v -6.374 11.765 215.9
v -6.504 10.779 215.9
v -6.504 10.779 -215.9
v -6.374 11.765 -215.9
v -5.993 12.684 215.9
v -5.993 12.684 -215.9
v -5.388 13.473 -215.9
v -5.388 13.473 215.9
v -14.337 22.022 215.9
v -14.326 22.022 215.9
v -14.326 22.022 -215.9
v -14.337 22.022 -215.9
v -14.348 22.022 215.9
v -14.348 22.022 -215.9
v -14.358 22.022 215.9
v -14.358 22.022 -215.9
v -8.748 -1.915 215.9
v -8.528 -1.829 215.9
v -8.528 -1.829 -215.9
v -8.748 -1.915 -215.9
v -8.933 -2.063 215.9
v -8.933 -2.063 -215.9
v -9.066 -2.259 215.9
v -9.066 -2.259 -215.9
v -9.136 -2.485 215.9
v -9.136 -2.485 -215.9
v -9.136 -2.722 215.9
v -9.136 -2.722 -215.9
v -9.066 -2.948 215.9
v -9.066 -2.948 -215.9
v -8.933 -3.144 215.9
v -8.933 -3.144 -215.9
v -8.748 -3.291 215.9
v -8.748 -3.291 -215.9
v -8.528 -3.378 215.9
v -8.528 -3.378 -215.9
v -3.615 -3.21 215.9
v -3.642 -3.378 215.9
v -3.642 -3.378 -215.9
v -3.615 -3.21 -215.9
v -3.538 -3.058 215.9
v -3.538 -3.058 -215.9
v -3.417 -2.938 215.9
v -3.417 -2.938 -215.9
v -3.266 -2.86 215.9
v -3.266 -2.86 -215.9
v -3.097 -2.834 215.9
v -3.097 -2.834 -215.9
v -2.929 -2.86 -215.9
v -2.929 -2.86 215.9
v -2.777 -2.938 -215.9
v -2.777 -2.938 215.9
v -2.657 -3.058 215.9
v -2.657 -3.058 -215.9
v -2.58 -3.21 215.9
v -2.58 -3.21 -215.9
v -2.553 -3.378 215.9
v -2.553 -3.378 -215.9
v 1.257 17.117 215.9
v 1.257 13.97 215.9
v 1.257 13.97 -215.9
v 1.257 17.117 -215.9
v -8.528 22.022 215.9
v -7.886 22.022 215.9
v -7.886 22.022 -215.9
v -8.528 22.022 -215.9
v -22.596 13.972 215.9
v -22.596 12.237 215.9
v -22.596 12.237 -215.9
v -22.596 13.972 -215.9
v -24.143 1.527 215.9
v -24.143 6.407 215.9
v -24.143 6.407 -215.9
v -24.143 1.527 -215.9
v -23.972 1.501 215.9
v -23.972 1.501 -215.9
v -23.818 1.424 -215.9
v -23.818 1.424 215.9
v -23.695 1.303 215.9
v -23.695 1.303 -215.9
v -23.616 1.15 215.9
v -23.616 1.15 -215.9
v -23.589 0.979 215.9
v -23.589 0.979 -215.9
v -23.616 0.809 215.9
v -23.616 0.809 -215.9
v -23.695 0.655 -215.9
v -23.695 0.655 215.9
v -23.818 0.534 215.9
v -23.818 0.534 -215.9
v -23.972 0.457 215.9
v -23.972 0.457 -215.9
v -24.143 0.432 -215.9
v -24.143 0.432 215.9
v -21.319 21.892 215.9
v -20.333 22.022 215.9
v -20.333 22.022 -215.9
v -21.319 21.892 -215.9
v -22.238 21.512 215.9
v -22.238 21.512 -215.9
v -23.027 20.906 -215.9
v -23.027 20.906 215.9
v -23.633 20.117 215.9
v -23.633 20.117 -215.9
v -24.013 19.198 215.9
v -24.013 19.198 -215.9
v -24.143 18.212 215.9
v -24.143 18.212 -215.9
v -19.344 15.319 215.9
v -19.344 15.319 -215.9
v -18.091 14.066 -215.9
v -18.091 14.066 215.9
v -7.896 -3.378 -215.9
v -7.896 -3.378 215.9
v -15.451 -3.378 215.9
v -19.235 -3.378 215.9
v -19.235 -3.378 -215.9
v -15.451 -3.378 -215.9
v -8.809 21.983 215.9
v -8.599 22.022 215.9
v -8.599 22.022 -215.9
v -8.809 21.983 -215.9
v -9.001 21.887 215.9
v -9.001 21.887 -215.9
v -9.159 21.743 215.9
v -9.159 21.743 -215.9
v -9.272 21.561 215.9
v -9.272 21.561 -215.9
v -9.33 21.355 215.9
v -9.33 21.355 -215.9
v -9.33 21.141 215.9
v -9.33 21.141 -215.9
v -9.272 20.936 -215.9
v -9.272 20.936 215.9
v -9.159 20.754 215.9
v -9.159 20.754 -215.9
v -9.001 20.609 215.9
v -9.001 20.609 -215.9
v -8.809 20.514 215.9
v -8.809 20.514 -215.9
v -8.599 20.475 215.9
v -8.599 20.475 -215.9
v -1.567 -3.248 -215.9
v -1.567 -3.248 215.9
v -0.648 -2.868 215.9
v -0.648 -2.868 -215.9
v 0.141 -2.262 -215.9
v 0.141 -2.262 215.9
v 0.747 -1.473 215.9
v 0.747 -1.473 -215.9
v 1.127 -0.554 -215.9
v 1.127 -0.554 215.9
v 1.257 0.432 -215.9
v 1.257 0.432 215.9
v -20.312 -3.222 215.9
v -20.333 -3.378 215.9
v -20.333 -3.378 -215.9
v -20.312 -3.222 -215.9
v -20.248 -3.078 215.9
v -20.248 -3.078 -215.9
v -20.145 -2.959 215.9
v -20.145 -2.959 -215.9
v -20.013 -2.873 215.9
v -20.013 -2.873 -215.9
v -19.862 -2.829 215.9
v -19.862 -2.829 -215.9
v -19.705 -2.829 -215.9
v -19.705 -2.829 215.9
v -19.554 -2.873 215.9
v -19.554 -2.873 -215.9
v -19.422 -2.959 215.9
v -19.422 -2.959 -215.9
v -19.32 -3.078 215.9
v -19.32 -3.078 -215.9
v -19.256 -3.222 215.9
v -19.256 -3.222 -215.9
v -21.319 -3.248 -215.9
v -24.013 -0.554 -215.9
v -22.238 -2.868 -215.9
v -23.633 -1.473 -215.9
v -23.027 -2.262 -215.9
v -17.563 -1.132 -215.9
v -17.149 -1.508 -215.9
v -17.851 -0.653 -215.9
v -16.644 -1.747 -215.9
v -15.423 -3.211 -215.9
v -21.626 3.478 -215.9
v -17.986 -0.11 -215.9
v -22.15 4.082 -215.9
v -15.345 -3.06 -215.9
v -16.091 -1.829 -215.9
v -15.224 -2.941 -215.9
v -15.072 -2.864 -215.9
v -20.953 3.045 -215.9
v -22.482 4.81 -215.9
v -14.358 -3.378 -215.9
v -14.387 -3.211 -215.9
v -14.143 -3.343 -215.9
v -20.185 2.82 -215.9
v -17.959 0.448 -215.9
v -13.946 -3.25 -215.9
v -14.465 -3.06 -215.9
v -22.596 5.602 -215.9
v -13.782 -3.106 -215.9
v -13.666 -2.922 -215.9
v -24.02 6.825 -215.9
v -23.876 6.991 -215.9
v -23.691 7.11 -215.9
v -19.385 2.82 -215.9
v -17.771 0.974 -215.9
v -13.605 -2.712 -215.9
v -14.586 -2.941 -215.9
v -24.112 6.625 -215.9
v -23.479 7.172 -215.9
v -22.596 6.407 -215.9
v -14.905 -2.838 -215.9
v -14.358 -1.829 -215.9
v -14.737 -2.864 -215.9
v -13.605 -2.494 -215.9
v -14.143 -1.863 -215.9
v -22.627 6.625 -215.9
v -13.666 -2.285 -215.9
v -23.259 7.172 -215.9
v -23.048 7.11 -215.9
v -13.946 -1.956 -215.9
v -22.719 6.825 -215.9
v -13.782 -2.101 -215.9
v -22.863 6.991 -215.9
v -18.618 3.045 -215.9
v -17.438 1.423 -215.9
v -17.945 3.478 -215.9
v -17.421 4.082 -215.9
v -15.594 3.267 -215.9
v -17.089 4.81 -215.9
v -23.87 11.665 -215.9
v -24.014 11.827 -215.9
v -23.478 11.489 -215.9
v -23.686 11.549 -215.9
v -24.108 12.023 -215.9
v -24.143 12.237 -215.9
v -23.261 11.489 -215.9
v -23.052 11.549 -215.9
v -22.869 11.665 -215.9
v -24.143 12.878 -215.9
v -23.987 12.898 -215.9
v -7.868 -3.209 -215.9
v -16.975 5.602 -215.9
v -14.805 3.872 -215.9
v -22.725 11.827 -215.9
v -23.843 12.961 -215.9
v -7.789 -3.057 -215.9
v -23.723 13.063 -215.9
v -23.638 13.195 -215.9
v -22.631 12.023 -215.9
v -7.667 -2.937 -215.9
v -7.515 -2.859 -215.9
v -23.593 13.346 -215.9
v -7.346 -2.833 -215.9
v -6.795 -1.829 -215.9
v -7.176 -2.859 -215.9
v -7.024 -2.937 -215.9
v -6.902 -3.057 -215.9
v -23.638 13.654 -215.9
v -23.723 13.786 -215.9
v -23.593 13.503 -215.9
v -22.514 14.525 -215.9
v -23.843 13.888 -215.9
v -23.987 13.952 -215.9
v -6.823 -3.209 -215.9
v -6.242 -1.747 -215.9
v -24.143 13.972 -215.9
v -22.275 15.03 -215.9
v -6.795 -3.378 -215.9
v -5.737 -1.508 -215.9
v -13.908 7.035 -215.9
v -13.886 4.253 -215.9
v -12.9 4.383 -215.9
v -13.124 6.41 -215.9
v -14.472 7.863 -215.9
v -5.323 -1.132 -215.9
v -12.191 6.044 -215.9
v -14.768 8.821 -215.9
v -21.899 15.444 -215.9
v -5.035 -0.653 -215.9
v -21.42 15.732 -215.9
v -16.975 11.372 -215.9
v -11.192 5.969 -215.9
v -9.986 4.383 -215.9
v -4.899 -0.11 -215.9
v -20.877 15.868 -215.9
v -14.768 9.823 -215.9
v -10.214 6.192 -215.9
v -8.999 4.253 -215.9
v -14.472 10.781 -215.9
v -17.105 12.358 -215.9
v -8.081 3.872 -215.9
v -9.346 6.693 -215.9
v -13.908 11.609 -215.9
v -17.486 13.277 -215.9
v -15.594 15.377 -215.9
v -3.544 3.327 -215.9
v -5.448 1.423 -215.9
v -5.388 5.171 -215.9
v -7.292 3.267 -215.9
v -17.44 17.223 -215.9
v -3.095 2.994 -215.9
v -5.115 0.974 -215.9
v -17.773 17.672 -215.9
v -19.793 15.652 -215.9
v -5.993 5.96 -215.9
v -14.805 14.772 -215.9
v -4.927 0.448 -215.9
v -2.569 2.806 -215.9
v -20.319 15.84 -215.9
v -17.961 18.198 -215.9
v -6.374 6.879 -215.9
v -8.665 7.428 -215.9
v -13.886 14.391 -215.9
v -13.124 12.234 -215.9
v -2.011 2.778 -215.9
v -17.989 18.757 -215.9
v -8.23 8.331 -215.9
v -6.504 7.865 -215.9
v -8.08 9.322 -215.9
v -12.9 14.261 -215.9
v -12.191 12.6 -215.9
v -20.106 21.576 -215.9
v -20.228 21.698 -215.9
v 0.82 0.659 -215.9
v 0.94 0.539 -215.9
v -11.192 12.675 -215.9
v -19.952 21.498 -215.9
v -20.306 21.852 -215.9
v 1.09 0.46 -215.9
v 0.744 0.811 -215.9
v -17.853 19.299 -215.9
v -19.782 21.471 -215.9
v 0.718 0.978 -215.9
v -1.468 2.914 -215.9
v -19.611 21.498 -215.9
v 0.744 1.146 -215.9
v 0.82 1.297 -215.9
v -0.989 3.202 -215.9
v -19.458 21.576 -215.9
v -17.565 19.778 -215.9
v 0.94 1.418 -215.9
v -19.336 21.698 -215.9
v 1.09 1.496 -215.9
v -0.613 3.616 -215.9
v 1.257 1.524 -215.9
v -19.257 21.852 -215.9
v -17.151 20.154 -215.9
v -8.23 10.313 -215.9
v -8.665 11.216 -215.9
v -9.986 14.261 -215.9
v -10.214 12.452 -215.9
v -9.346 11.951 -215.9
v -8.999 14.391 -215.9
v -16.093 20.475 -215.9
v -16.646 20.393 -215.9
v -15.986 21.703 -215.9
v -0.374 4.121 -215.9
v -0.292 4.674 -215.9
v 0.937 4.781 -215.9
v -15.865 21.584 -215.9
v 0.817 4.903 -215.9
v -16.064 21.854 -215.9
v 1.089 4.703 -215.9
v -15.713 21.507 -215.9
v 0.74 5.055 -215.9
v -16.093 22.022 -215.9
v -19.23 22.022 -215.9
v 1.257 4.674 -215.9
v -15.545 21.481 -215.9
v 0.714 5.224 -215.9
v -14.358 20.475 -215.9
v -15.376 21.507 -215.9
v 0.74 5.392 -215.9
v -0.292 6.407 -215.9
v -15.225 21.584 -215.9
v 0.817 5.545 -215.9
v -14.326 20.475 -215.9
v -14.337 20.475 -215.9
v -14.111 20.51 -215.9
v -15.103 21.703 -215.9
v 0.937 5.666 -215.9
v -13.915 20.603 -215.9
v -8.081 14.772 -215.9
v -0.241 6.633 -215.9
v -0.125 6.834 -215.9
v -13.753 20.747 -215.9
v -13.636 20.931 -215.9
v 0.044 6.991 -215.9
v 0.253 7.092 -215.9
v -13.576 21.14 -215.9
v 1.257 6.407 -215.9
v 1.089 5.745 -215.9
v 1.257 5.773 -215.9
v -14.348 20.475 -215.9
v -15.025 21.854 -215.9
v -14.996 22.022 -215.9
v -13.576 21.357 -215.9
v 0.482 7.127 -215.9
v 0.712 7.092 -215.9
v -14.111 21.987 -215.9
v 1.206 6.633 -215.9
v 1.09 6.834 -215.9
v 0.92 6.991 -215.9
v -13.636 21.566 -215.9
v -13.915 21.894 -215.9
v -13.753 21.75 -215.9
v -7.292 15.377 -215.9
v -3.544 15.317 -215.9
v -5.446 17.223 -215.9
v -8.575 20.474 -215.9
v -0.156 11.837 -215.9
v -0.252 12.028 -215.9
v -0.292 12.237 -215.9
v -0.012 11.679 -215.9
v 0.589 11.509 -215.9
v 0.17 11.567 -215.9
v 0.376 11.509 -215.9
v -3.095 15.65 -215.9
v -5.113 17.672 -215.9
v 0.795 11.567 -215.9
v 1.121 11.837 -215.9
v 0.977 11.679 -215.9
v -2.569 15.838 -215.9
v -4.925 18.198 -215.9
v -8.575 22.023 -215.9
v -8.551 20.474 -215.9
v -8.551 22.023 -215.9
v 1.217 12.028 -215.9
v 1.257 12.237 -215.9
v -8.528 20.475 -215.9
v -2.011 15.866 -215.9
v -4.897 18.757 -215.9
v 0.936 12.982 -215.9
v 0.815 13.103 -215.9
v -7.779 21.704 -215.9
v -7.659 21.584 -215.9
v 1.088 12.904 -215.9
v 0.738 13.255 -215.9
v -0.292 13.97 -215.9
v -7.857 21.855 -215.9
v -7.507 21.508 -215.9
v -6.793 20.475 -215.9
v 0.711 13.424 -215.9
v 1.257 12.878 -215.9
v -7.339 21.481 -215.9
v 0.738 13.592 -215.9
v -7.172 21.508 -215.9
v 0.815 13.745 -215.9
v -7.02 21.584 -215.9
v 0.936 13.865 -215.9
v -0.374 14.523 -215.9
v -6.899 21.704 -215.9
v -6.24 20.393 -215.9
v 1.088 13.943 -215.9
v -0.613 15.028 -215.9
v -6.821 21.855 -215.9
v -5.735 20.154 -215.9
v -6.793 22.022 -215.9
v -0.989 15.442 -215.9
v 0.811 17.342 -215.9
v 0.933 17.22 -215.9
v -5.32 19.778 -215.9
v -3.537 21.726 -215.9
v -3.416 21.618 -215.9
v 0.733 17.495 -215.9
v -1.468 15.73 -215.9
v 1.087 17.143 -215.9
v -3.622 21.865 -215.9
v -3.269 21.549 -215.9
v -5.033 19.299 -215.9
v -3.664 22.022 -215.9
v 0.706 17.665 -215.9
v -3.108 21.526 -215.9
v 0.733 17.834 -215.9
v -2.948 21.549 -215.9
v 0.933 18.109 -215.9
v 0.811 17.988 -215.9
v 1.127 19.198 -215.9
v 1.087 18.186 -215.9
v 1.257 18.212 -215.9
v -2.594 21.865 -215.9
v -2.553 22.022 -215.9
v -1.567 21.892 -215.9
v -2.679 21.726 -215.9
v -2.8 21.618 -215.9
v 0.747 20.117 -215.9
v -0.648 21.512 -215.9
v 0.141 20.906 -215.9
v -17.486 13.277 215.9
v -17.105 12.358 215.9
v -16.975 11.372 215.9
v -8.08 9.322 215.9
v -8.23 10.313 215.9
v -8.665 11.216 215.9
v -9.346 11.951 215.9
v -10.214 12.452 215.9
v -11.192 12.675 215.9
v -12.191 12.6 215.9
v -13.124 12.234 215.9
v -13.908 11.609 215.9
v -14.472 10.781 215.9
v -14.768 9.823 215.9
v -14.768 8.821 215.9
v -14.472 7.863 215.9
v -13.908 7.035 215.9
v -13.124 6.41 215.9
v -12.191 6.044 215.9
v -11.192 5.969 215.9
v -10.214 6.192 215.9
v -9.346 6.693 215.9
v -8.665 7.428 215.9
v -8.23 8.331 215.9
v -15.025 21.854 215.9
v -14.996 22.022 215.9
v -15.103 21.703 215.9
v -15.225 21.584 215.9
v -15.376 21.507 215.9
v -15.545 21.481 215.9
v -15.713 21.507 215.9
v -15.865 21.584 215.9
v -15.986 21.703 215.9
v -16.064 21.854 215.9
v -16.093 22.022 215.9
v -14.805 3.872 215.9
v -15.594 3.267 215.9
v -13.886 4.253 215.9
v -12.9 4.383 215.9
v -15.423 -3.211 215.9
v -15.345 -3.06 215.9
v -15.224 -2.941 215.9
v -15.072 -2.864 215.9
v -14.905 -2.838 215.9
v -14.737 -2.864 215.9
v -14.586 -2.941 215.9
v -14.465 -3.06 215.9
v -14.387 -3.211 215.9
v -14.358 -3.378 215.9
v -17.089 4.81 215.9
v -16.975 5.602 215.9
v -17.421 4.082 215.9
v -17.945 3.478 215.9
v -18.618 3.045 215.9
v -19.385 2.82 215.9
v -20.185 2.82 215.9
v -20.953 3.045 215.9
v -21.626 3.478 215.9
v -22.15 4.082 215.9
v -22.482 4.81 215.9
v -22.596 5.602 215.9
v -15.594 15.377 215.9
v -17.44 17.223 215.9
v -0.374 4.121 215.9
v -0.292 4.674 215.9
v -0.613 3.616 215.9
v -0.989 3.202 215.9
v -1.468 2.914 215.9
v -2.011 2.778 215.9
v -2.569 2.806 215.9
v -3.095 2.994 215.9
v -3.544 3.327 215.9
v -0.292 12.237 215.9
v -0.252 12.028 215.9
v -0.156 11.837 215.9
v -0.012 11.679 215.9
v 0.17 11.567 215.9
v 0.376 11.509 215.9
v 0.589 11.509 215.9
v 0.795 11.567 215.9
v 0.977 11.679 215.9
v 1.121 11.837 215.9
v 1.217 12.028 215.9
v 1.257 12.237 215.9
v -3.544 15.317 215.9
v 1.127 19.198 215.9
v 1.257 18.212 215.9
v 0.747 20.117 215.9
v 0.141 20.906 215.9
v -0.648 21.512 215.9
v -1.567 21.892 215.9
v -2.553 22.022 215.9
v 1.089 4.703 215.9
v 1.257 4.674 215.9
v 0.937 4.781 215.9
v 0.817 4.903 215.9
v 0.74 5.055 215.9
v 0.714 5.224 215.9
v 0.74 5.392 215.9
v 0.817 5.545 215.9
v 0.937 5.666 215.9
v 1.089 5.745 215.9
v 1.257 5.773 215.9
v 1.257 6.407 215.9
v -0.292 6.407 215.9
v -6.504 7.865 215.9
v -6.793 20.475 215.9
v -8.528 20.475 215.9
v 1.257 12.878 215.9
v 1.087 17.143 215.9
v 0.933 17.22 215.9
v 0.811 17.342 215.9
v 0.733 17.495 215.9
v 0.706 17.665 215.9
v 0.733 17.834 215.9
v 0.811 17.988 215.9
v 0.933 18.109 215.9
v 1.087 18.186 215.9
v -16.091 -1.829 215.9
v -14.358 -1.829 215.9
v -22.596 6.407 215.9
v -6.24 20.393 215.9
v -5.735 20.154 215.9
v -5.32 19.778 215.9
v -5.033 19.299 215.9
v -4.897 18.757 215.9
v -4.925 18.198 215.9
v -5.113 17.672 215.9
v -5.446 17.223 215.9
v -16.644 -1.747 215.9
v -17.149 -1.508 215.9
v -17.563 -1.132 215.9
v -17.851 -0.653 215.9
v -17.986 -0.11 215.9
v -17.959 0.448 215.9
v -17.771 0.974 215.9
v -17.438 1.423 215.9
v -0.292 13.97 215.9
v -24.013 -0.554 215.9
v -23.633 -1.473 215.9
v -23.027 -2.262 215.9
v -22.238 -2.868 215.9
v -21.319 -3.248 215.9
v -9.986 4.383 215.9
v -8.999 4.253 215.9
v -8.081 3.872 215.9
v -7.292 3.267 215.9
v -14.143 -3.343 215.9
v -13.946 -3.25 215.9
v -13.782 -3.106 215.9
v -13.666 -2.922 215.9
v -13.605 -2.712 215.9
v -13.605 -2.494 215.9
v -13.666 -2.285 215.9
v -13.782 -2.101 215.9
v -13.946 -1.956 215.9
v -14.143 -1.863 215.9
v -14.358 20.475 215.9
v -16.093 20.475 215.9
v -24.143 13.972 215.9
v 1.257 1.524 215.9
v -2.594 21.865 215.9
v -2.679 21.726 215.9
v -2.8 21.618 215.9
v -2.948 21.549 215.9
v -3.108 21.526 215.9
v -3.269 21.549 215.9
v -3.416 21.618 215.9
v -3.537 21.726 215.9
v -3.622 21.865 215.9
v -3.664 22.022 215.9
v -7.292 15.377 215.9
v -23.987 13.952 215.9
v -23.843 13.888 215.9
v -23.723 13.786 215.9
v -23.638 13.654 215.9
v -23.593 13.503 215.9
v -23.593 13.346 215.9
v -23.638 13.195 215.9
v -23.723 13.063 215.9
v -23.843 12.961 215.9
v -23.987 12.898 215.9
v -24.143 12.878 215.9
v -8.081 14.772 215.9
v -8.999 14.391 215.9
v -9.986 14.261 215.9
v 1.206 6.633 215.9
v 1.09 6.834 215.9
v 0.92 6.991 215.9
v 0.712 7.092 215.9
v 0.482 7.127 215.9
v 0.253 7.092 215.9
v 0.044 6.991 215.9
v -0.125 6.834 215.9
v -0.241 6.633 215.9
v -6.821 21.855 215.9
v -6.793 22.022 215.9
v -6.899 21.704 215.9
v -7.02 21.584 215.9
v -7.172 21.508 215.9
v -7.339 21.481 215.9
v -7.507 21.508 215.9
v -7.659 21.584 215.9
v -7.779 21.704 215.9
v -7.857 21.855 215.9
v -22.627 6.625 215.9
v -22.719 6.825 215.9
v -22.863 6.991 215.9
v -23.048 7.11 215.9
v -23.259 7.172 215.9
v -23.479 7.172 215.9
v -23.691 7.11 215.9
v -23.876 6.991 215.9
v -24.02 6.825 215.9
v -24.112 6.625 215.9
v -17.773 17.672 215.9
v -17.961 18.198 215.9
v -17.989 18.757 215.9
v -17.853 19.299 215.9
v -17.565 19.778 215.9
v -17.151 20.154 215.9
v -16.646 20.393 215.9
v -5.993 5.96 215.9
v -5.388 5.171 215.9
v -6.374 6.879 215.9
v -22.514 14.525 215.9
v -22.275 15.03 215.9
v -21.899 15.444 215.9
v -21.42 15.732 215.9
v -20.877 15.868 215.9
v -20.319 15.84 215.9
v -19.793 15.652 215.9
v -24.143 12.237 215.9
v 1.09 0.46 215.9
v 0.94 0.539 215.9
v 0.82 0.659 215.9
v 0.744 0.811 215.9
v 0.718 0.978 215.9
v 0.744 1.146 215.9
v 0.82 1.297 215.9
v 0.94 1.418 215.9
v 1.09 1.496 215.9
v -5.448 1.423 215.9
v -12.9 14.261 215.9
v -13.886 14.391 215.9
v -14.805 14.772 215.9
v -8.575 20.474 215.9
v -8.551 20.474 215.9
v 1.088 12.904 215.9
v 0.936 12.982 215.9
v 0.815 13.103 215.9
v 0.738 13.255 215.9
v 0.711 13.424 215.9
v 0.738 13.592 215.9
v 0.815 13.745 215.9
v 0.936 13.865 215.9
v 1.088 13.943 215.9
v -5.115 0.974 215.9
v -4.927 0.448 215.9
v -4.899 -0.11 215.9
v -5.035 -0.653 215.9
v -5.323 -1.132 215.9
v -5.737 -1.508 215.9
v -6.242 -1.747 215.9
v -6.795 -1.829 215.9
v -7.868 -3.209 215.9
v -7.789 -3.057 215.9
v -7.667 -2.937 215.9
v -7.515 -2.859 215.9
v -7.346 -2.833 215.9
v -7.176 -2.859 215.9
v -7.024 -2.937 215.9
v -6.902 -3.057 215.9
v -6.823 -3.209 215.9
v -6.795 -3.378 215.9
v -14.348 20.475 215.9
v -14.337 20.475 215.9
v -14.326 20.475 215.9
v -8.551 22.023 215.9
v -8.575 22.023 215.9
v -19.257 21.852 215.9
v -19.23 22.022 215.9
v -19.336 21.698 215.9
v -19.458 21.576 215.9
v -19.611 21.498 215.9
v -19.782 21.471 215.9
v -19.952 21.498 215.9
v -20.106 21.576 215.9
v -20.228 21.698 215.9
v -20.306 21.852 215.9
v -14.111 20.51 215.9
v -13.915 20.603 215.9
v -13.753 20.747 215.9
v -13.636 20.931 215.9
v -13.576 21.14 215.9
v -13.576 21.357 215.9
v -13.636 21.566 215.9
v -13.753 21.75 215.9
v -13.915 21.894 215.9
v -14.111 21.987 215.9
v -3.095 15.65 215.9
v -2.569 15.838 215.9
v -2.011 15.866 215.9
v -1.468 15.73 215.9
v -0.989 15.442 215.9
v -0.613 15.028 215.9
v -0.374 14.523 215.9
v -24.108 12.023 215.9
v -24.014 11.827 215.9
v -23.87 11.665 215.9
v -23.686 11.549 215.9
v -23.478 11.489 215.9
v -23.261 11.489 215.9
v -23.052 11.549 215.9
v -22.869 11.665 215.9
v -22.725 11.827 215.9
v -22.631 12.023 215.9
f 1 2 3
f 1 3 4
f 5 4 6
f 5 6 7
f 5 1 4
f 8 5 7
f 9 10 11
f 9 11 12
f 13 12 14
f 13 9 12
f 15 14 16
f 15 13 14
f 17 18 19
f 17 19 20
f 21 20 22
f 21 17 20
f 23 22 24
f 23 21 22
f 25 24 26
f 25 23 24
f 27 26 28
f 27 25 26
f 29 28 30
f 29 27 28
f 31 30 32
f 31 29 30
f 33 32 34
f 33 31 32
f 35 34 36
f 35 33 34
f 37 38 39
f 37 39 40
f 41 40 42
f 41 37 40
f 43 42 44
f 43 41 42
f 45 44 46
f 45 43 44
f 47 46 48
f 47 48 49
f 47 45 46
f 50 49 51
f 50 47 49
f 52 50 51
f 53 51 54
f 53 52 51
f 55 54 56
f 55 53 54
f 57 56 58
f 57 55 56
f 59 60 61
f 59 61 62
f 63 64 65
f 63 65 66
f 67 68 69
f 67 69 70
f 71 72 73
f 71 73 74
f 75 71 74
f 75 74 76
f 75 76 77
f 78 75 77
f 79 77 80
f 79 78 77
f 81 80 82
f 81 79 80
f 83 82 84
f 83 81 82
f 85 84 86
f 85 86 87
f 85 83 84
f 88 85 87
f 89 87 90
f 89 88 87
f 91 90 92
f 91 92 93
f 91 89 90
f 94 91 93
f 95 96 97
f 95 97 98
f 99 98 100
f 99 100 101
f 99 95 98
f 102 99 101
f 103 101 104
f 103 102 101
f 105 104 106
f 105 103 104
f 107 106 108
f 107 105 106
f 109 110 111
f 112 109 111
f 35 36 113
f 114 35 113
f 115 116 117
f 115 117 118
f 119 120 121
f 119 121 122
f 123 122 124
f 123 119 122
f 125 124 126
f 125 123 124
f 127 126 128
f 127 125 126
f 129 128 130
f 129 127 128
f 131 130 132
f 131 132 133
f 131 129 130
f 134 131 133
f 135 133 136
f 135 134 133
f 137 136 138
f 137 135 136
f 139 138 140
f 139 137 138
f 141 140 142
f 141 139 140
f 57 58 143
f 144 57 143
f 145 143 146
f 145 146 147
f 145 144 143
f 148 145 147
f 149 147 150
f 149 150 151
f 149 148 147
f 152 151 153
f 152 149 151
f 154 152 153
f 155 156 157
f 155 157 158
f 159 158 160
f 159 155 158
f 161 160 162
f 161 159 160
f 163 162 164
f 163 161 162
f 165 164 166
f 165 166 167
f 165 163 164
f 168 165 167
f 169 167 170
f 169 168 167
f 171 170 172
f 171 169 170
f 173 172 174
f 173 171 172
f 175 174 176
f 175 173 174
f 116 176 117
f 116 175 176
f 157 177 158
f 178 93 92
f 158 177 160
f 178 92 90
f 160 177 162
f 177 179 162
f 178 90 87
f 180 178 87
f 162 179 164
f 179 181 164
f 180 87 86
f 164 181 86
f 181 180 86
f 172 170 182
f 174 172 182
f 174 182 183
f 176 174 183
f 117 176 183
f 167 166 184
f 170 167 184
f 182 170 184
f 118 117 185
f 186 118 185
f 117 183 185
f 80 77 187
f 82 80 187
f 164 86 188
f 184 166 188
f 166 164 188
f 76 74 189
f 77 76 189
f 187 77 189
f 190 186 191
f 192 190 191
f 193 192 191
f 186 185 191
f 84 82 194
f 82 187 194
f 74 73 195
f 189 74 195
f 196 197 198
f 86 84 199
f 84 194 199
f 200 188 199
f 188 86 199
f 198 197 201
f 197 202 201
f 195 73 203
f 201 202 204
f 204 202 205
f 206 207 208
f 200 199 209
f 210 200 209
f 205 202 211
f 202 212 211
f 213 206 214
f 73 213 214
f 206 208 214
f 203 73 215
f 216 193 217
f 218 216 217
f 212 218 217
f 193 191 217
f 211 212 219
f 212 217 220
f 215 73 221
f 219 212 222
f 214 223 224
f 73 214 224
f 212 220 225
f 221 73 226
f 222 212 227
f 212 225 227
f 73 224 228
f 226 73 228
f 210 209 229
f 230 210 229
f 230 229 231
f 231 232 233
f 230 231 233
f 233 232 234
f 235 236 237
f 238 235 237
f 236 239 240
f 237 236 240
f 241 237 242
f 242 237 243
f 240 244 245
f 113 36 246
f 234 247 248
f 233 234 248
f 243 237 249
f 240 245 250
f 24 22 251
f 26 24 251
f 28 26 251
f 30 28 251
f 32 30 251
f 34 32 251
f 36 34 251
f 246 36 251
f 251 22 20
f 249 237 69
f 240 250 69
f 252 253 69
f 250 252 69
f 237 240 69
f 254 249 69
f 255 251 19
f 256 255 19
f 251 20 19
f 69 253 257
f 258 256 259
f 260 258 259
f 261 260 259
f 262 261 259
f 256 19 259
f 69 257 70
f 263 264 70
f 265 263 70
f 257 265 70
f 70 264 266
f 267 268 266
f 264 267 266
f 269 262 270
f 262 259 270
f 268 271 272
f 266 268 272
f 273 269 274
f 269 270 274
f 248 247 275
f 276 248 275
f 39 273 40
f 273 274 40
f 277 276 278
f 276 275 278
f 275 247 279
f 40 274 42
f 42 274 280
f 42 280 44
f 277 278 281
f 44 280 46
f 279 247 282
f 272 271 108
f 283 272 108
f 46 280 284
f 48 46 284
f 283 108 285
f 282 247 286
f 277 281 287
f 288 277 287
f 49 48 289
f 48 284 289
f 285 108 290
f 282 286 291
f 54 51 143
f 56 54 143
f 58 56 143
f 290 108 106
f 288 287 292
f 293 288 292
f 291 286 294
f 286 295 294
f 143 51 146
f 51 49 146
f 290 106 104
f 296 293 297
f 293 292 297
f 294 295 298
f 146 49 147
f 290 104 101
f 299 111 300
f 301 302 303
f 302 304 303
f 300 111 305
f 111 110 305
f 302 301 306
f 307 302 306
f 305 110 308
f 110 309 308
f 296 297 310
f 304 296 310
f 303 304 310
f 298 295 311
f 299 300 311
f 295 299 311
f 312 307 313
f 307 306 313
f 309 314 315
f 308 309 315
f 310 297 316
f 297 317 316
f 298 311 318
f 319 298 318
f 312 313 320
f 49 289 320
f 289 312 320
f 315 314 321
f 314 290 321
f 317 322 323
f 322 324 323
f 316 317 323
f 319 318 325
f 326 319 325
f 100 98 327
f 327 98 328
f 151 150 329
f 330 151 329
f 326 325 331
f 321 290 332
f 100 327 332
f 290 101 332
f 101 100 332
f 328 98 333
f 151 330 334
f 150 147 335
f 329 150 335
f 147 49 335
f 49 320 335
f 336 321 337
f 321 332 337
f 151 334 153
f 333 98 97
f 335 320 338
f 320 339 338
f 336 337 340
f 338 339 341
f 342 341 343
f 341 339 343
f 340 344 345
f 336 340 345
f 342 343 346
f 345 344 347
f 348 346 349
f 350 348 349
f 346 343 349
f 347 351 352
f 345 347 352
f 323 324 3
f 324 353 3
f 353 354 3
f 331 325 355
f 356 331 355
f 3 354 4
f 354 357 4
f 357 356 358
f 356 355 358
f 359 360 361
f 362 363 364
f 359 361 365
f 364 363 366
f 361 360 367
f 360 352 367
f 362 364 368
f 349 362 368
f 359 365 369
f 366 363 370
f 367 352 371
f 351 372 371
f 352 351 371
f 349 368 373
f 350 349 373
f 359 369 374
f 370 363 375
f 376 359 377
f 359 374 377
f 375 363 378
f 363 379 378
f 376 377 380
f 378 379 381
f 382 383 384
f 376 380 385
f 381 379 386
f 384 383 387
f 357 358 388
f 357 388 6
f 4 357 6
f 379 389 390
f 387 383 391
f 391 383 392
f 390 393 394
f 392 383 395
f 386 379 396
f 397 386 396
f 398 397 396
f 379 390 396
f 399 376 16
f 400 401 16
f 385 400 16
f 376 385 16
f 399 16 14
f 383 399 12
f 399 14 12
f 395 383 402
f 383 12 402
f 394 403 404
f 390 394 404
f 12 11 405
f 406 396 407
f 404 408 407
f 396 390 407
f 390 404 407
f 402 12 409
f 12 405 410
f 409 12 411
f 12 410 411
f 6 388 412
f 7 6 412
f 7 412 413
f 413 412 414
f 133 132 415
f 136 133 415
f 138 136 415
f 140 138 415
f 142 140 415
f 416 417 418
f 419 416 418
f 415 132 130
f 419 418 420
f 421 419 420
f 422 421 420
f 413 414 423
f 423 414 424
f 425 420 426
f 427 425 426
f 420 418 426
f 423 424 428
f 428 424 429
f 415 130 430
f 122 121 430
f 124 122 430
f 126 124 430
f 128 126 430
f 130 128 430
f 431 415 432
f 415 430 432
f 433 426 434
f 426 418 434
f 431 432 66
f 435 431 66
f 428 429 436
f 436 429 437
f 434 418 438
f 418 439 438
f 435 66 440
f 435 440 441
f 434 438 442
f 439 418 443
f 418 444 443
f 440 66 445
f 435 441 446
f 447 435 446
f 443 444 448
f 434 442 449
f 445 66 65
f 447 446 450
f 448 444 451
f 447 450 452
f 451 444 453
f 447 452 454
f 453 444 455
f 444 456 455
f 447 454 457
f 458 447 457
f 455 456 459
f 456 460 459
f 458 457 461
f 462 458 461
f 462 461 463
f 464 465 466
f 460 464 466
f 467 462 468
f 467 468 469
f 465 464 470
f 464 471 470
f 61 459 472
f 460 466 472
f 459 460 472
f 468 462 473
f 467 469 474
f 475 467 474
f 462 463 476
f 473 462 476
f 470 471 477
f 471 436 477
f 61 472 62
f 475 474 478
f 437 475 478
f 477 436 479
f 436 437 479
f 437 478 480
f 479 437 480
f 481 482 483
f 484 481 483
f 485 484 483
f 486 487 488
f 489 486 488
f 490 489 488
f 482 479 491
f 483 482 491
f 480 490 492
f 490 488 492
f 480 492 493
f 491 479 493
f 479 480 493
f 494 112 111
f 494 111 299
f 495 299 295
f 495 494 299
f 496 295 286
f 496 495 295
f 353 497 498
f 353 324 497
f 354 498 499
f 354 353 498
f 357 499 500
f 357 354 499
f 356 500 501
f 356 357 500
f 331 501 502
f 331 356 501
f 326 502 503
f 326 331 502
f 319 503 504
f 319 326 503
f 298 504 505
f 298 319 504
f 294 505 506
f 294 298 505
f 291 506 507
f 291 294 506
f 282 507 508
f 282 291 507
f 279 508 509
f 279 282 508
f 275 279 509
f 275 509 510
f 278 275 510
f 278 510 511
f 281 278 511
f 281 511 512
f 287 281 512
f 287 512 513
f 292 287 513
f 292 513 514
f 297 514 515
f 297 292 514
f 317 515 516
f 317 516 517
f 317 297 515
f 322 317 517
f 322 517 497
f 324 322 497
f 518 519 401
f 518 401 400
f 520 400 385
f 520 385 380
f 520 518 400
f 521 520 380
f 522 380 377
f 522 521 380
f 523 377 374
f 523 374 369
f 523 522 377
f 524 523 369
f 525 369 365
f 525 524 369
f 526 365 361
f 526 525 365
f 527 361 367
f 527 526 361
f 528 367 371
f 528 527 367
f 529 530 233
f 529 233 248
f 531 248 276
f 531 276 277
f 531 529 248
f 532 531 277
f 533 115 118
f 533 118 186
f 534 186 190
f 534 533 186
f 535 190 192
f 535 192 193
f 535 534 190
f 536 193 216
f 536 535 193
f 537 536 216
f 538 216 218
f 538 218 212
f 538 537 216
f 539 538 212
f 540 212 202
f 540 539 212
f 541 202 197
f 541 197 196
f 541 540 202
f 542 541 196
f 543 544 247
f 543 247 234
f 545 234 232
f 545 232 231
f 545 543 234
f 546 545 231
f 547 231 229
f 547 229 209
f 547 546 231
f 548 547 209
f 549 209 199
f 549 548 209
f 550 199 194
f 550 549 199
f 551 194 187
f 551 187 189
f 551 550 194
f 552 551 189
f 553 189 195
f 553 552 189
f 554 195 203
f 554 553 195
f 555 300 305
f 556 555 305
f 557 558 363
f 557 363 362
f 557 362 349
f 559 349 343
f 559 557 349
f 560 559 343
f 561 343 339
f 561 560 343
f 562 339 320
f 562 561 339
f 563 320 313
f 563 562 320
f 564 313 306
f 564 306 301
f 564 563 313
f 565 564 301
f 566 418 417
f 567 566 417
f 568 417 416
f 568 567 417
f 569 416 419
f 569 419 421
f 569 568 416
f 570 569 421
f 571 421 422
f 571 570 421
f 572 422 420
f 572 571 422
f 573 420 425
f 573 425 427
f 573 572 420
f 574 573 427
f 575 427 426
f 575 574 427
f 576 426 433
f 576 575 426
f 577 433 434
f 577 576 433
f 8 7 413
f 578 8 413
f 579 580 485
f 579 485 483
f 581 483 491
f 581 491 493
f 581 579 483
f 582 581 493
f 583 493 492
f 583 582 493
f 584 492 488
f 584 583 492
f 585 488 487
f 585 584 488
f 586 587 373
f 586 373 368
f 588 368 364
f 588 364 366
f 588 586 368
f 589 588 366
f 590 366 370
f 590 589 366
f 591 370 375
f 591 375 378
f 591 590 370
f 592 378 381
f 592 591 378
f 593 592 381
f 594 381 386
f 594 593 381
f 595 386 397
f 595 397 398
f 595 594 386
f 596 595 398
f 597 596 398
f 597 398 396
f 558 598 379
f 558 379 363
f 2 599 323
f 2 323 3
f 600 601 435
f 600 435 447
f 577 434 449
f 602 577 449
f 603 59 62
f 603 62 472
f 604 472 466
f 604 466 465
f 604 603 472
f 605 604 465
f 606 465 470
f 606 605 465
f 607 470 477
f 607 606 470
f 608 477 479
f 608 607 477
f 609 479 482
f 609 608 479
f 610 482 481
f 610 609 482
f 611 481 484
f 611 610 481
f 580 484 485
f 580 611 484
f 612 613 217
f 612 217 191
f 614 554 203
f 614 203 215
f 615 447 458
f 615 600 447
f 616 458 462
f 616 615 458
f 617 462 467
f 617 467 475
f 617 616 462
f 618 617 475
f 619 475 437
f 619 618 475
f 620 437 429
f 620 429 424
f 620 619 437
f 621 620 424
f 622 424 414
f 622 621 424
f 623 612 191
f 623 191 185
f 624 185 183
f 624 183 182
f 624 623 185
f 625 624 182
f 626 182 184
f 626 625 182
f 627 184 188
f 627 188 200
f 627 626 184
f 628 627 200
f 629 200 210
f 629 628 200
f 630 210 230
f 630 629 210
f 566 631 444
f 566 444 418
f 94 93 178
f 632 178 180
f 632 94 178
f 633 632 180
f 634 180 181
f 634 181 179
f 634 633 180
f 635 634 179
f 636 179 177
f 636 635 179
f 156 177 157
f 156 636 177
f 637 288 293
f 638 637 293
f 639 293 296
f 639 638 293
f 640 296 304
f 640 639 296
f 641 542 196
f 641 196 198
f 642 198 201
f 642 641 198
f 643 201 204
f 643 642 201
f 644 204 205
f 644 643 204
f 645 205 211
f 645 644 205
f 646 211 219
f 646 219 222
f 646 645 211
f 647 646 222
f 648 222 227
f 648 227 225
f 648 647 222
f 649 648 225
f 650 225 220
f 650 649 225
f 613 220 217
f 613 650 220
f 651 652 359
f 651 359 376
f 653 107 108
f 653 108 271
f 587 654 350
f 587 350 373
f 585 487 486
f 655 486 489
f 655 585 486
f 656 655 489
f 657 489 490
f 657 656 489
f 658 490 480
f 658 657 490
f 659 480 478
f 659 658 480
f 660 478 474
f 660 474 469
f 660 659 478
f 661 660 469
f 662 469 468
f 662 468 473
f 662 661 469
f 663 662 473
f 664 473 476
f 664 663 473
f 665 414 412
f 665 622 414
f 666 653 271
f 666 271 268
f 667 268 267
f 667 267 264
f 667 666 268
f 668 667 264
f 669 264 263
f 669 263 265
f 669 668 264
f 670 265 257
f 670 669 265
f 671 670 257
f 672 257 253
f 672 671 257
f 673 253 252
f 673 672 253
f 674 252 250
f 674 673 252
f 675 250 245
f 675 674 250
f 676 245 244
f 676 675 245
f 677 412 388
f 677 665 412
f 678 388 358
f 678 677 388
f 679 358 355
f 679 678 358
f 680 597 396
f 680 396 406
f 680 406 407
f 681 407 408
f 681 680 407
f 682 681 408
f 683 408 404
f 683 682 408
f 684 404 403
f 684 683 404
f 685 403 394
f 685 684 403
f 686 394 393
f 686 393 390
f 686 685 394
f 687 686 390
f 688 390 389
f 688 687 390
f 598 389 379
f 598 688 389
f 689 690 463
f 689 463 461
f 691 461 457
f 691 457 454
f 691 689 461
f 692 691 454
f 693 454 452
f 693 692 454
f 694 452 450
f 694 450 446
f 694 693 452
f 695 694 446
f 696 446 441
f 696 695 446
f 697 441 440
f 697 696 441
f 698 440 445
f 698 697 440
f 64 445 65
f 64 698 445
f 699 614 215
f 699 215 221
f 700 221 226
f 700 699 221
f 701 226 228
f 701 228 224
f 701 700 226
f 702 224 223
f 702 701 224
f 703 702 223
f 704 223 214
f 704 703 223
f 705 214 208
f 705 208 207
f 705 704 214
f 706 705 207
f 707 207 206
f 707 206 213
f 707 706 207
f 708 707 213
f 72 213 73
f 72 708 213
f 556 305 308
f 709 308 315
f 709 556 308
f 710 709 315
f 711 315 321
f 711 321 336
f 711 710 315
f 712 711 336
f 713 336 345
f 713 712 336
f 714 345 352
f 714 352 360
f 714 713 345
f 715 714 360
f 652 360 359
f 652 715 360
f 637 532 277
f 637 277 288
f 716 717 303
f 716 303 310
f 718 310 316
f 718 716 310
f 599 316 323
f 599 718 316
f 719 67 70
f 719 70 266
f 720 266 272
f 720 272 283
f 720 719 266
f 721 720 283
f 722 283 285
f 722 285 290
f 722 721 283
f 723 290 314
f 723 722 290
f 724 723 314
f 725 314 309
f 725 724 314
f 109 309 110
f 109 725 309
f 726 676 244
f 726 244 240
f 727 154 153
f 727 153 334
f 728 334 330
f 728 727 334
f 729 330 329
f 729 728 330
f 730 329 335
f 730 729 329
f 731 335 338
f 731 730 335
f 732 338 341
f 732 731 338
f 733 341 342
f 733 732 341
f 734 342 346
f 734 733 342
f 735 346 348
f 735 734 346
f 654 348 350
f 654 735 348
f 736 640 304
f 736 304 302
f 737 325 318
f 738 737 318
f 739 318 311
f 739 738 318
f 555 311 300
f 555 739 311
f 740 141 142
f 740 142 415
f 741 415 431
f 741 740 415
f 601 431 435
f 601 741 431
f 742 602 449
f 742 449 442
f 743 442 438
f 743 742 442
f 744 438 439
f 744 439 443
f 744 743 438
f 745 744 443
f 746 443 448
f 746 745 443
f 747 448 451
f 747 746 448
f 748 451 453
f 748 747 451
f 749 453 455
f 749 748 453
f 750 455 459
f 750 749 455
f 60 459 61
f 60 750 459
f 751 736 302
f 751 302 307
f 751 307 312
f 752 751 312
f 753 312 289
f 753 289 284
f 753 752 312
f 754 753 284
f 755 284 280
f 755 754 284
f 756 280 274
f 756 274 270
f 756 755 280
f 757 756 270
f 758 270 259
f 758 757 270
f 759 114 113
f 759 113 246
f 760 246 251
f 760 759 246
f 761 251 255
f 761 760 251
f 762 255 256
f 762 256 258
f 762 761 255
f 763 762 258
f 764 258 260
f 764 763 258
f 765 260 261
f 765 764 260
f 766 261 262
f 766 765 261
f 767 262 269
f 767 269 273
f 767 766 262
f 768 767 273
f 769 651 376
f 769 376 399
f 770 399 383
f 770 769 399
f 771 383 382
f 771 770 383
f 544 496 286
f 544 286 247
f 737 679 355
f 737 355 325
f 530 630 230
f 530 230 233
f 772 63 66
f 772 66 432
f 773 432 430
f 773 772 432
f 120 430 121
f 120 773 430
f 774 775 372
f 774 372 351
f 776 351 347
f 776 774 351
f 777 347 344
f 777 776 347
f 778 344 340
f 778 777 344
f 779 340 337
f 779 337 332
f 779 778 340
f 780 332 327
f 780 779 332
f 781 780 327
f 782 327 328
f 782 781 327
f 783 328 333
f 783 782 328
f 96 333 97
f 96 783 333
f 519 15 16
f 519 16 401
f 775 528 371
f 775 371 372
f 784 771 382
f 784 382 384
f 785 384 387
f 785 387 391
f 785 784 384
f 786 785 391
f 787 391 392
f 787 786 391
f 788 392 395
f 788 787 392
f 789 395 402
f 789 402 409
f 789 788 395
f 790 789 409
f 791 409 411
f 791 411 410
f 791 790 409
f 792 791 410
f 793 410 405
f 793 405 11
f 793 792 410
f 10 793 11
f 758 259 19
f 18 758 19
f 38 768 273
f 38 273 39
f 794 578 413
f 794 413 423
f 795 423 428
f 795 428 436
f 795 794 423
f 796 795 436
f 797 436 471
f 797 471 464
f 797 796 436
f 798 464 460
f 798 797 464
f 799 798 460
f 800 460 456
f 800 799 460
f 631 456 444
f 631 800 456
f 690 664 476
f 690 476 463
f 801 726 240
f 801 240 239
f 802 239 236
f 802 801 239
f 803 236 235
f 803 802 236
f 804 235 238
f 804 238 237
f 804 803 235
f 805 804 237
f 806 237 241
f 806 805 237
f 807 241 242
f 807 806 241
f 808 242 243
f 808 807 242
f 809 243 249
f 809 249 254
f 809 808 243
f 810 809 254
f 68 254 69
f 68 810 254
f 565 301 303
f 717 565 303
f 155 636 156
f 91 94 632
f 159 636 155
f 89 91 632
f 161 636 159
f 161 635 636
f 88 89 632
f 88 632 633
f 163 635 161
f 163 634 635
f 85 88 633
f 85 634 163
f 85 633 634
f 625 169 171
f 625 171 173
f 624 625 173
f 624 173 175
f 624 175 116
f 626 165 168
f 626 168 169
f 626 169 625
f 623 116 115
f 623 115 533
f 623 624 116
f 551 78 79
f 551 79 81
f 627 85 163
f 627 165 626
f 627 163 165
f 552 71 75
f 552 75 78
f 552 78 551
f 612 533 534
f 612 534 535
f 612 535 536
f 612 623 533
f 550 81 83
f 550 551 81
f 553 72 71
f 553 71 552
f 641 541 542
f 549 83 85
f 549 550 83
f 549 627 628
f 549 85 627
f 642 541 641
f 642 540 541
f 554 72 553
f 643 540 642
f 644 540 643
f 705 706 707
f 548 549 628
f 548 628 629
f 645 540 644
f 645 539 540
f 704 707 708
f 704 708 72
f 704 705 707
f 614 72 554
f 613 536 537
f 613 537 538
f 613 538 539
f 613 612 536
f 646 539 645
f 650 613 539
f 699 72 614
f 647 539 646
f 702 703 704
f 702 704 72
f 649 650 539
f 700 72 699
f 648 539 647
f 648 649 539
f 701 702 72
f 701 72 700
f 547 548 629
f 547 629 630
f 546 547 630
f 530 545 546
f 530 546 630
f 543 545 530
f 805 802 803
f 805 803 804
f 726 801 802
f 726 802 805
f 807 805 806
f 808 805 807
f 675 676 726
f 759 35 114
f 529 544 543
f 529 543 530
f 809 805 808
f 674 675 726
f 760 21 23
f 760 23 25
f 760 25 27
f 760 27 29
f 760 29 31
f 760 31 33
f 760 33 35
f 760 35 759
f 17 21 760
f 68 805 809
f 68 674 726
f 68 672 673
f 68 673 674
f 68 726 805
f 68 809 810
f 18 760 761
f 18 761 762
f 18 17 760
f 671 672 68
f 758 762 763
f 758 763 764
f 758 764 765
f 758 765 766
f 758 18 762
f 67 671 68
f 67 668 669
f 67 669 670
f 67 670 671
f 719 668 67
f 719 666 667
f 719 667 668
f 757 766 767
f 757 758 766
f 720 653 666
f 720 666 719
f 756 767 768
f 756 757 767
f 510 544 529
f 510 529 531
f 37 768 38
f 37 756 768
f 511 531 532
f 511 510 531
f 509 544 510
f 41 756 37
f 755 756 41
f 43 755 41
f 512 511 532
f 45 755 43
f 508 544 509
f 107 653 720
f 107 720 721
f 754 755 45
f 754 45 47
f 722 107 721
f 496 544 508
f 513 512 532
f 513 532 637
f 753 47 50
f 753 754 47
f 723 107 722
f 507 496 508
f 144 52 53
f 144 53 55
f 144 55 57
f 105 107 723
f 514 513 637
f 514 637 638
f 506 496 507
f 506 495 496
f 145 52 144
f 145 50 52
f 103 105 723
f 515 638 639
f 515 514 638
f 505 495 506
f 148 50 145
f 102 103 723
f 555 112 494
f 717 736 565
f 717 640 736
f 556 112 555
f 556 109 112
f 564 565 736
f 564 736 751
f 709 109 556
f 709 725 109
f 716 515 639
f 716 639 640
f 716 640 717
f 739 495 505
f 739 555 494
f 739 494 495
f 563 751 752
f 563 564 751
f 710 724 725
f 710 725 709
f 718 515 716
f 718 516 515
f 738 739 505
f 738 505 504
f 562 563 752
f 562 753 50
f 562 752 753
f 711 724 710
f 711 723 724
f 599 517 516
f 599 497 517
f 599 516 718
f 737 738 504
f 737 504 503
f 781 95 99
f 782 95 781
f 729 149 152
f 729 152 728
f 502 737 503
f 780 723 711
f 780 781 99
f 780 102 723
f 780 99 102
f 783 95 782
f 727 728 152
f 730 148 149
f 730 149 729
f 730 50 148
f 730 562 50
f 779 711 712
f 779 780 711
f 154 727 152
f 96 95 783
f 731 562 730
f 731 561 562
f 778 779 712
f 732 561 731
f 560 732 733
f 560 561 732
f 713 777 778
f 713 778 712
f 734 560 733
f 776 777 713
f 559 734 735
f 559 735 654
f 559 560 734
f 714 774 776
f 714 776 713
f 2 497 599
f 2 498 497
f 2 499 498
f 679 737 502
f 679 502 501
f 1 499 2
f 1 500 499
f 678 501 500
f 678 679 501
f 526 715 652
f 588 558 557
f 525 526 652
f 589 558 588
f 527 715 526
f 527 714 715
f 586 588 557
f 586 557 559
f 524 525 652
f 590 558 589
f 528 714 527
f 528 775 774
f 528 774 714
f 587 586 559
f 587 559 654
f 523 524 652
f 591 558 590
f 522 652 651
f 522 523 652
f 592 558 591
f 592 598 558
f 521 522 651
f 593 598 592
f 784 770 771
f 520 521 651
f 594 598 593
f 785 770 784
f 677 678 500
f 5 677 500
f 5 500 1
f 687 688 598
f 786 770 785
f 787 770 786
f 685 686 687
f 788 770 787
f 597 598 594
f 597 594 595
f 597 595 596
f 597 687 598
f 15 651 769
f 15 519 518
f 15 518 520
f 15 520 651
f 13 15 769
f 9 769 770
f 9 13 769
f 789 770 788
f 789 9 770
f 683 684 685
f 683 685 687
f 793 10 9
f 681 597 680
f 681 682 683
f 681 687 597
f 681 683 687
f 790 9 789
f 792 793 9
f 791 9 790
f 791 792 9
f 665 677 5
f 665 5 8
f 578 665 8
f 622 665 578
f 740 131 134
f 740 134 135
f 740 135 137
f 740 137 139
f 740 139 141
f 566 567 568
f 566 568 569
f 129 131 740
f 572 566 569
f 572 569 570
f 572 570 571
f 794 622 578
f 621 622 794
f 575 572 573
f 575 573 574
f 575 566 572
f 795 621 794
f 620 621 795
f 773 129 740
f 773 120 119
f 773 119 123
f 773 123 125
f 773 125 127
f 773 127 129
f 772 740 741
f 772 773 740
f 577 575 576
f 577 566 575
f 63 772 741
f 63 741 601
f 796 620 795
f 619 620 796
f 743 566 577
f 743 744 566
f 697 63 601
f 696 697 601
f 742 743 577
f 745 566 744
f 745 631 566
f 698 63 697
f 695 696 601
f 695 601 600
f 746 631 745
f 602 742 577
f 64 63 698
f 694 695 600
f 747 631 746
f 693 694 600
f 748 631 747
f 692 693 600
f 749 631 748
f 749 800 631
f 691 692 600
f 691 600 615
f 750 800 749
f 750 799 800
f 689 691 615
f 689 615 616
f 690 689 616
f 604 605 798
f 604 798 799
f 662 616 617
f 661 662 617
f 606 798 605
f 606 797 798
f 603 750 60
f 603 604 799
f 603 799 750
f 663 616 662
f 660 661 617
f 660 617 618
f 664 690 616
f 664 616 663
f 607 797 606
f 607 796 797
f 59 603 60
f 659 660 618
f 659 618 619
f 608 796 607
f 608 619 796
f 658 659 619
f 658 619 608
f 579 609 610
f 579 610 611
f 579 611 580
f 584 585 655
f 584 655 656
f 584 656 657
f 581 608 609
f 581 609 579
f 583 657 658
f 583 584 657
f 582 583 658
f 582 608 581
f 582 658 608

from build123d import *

# Parameters (mm, degrees)
F0_R     = 3.362501
F1_DEPTH = 215.9


with BuildPart() as f1:
    # F0 (on Top) → F1 (new body, symmetric)
    with BuildSketch(Plane.XY):
        with BuildLine():
            ThreePointArc((-7.291522, 15.377258), (-8.527575, 14.551354), (-9.985599, 14.261335))
            Line((-9.985599, 14.261335), (-12.900292, 14.261335))
            ThreePointArc((-12.900292, 14.261335), (-14.358316, 14.551354), (-15.594369, 15.377258))
            Line((-15.594369, 15.377258), (-17.43985, 17.222739))
            ThreePointArc((-17.43985, 17.222739), (-17.852803, 19.29879), (-16.092812, 20.474778))
            Line((-16.092812, 20.474778), (-14.358316, 20.474778))
            Line((-14.358316, 20.474778), (-14.325965, 20.474778))
            ThreePointArc((-14.325965, 20.474778), (-13.56835, 21.248399), (-14.325965, 22.02202))
            Line((-14.325965, 22.02202), (-14.358316, 22.02202))
            Line((-14.358316, 22.02202), (-14.996286, 22.02202))
            ThreePointArc((-14.996286, 22.02202), (-15.544549, 21.480792), (-16.092812, 22.02202))
            Line((-16.092812, 22.02202), (-19.230427, 22.02202))
            ThreePointArc((-19.230427, 22.02202), (-19.781686, 21.470761), (-20.332945, 22.02202))
            ThreePointArc((-20.332945, 22.02202), (-23.027022, 20.906097), (-24.142945, 18.21202))
            Line((-24.142945, 18.21202), (-24.142945, 17.126744))
            Line((-24.142945, 17.126744), (-24.142945, 13.971887))
            ThreePointArc((-24.142945, 13.971887), (-23.587106, 13.424695), (-24.142945, 12.877503))
            Line((-24.142945, 12.877503), (-24.142945, 12.23739))
            ThreePointArc((-24.142945, 12.23739), (-23.369324, 11.481574), (-22.595703, 12.23739))
            Line((-22.595703, 12.23739), (-22.595703, 13.971887))
            ThreePointArc((-22.595703, 13.971887), (-21.419715, 15.731877), (-19.343665, 15.318925))
            Line((-19.343665, 15.318925), (-18.091092, 14.066352))
            ThreePointArc((-18.091092, 14.066352), (-17.265188, 12.830299), (-16.975169, 11.372275))
            Line((-16.975169, 11.372275), (-16.975169, 5.601584))
            ThreePointArc((-16.975169, 5.601584), (-19.785436, 2.791317), (-22.595703, 5.601584))
            Line((-22.595703, 5.601584), (-22.595703, 6.406649))
            ThreePointArc((-22.595703, 6.406649), (-23.369324, 7.18027), (-24.142945, 6.406649))
            Line((-24.142945, 6.406649), (-24.142945, 5.771259))
            Line((-24.142945, 5.771259), (-24.142945, 1.526558))
            ThreePointArc((-24.142945, 1.526558), (-23.589161, 0.979289), (-24.142945, 0.43202))
            ThreePointArc((-24.142945, 0.43202), (-23.027022, -2.262057), (-20.332945, -3.37798))
            ThreePointArc((-20.332945, -3.37798), (-19.783762, -2.823095), (-19.234579, -3.37798))
            Line((-19.234579, -3.37798), (-15.451114, -3.37798))
            ThreePointArc((-15.451114, -3.37798), (-14.904715, -2.837846), (-14.358316, -3.37798))
            ThreePointArc((-14.358316, -3.37798), (-13.597129, -2.60328), (-14.358316, -1.82858))
            Line((-14.358316, -1.82858), (-16.090654, -1.82858))
            ThreePointArc((-16.090654, -1.82858), (-17.850645, -0.652592), (-17.437693, 1.423458))
            Line((-17.437693, 1.423458), (-15.594369, 3.266782))
            ThreePointArc((-15.594369, 3.266782), (-14.358316, 4.092686), (-12.900292, 4.382705))
            Line((-12.900292, 4.382705), (-9.985599, 4.382705))
            ThreePointArc((-9.985599, 4.382705), (-8.527575, 4.092686), (-7.291522, 3.266782))
            Line((-7.291522, 3.266782), (-5.448198, 1.423458))
            ThreePointArc((-5.448198, 1.423458), (-5.035246, -0.652592), (-6.795236, -1.82858))
            Line((-6.795236, -1.82858), (-8.527575, -1.82858))
            ThreePointArc((-8.527575, -1.82858), (-9.144781, -2.60328), (-8.527575, -3.37798))
            Line((-8.527575, -3.37798), (-7.895813, -3.37798))
            ThreePointArc((-7.895813, -3.37798), (-7.345525, -2.832718), (-6.795236, -3.37798))
            Line((-6.795236, -3.37798), (-3.641811, -3.37798))
            ThreePointArc((-3.641811, -3.37798), (-3.097378, -2.833547), (-2.552945, -3.37798))
            ThreePointArc((-2.552945, -3.37798), (0.141132, -2.262057), (1.257055, 0.43202))
            ThreePointArc((1.257055, 0.43202), (0.717674, 0.97812), (1.257055, 1.52422))
            Line((1.257055, 1.52422), (1.257055, 4.674311))
            ThreePointArc((1.257055, 4.674311), (0.713538, 5.22368), (1.257055, 5.773049))
            Line((1.257055, 5.773049), (1.257055, 6.406649))
            ThreePointArc((1.257055, 6.406649), (0.482355, 7.126711), (-0.292345, 6.406649))
            Line((-0.292345, 6.406649), (-0.292345, 4.674311))
            ThreePointArc((-0.292345, 4.674311), (-1.468333, 2.91432), (-3.544384, 3.327273))
            Line((-3.544384, 3.327273), (-5.387707, 5.170596))
            ThreePointArc((-5.387707, 5.170596), (-6.213612, 6.406649), (-6.503631, 7.864673))
            Line((-6.503631, 7.864673), (-6.503631, 10.779367))
            ThreePointArc((-6.503631, 10.779367), (-6.213612, 12.23739), (-5.387707, 13.473443))
            Line((-5.387707, 13.473443), (-3.544384, 15.316767))
            ThreePointArc((-3.544384, 15.316767), (-1.468333, 15.729719), (-0.292345, 13.969729))
            Line((-0.292345, 13.969729), (-0.292345, 12.23739))
            ThreePointArc((-0.292345, 12.23739), (0.482355, 11.501425), (1.257055, 12.23739))
            Line((1.257055, 12.23739), (1.257055, 12.877529))
            ThreePointArc((1.257055, 12.877529), (0.710955, 13.423629), (1.257055, 13.969729))
            Line((1.257055, 13.969729), (1.257055, 17.117185))
            ThreePointArc((1.257055, 17.117185), (0.705999, 17.664602), (1.257055, 18.21202))
            ThreePointArc((1.257055, 18.21202), (0.141132, 20.906097), (-2.552945, 22.02202))
            ThreePointArc((-2.552945, 22.02202), (-3.108248, 21.525639), (-3.663551, 22.02202))
            Line((-3.663551, 22.02202), (-6.793078, 22.02202))
            ThreePointArc((-6.793078, 22.02202), (-7.33931, 21.481453), (-7.885542, 22.02202))
            Line((-7.885542, 22.02202), (-8.527575, 22.02202))
            Line((-8.527575, 22.02202), (-8.599148, 22.02202))
            ThreePointArc((-8.599148, 22.02202), (-9.33781, 21.248399), (-8.599148, 20.474778))
            Line((-8.599148, 20.474778), (-8.527575, 20.474778))
            Line((-8.527575, 20.474778), (-6.793078, 20.474778))
            ThreePointArc((-6.793078, 20.474778), (-5.033088, 19.29879), (-5.44604, 17.222739))
            Line((-5.44604, 17.222739), (-7.291522, 15.377258))
        make_face()
        with Locations((-11.442945, 9.32202)):
            Circle(F0_R, mode=Mode.SUBTRACT)
        with BuildLine():
            ThreePointArc((-8.599148, 20.474778), (-8.563361, 20.473951), (-8.527575, 20.474778))
            Line((-8.527575, 20.474778), (-8.599148, 20.474778))
        make_face()
        with BuildLine():
            Line((-14.325965, 20.474778), (-14.358316, 20.474778))
            ThreePointArc((-14.358316, 20.474778), (-14.34214, 20.474609), (-14.325965, 20.474778))
        make_face()
        with BuildLine():
            ThreePointArc((-8.527575, 22.02202), (-8.563361, 22.022847), (-8.599148, 22.02202))
            Line((-8.599148, 22.02202), (-8.527575, 22.02202))
        make_face()
        with BuildLine():
            Line((-14.358316, 22.02202), (-14.325965, 22.02202))
            ThreePointArc((-14.325965, 22.02202), (-14.34214, 22.022189), (-14.358316, 22.02202))
        make_face()
    extrude(amount=F1_DEPTH, both=True)


solid = f1.part
